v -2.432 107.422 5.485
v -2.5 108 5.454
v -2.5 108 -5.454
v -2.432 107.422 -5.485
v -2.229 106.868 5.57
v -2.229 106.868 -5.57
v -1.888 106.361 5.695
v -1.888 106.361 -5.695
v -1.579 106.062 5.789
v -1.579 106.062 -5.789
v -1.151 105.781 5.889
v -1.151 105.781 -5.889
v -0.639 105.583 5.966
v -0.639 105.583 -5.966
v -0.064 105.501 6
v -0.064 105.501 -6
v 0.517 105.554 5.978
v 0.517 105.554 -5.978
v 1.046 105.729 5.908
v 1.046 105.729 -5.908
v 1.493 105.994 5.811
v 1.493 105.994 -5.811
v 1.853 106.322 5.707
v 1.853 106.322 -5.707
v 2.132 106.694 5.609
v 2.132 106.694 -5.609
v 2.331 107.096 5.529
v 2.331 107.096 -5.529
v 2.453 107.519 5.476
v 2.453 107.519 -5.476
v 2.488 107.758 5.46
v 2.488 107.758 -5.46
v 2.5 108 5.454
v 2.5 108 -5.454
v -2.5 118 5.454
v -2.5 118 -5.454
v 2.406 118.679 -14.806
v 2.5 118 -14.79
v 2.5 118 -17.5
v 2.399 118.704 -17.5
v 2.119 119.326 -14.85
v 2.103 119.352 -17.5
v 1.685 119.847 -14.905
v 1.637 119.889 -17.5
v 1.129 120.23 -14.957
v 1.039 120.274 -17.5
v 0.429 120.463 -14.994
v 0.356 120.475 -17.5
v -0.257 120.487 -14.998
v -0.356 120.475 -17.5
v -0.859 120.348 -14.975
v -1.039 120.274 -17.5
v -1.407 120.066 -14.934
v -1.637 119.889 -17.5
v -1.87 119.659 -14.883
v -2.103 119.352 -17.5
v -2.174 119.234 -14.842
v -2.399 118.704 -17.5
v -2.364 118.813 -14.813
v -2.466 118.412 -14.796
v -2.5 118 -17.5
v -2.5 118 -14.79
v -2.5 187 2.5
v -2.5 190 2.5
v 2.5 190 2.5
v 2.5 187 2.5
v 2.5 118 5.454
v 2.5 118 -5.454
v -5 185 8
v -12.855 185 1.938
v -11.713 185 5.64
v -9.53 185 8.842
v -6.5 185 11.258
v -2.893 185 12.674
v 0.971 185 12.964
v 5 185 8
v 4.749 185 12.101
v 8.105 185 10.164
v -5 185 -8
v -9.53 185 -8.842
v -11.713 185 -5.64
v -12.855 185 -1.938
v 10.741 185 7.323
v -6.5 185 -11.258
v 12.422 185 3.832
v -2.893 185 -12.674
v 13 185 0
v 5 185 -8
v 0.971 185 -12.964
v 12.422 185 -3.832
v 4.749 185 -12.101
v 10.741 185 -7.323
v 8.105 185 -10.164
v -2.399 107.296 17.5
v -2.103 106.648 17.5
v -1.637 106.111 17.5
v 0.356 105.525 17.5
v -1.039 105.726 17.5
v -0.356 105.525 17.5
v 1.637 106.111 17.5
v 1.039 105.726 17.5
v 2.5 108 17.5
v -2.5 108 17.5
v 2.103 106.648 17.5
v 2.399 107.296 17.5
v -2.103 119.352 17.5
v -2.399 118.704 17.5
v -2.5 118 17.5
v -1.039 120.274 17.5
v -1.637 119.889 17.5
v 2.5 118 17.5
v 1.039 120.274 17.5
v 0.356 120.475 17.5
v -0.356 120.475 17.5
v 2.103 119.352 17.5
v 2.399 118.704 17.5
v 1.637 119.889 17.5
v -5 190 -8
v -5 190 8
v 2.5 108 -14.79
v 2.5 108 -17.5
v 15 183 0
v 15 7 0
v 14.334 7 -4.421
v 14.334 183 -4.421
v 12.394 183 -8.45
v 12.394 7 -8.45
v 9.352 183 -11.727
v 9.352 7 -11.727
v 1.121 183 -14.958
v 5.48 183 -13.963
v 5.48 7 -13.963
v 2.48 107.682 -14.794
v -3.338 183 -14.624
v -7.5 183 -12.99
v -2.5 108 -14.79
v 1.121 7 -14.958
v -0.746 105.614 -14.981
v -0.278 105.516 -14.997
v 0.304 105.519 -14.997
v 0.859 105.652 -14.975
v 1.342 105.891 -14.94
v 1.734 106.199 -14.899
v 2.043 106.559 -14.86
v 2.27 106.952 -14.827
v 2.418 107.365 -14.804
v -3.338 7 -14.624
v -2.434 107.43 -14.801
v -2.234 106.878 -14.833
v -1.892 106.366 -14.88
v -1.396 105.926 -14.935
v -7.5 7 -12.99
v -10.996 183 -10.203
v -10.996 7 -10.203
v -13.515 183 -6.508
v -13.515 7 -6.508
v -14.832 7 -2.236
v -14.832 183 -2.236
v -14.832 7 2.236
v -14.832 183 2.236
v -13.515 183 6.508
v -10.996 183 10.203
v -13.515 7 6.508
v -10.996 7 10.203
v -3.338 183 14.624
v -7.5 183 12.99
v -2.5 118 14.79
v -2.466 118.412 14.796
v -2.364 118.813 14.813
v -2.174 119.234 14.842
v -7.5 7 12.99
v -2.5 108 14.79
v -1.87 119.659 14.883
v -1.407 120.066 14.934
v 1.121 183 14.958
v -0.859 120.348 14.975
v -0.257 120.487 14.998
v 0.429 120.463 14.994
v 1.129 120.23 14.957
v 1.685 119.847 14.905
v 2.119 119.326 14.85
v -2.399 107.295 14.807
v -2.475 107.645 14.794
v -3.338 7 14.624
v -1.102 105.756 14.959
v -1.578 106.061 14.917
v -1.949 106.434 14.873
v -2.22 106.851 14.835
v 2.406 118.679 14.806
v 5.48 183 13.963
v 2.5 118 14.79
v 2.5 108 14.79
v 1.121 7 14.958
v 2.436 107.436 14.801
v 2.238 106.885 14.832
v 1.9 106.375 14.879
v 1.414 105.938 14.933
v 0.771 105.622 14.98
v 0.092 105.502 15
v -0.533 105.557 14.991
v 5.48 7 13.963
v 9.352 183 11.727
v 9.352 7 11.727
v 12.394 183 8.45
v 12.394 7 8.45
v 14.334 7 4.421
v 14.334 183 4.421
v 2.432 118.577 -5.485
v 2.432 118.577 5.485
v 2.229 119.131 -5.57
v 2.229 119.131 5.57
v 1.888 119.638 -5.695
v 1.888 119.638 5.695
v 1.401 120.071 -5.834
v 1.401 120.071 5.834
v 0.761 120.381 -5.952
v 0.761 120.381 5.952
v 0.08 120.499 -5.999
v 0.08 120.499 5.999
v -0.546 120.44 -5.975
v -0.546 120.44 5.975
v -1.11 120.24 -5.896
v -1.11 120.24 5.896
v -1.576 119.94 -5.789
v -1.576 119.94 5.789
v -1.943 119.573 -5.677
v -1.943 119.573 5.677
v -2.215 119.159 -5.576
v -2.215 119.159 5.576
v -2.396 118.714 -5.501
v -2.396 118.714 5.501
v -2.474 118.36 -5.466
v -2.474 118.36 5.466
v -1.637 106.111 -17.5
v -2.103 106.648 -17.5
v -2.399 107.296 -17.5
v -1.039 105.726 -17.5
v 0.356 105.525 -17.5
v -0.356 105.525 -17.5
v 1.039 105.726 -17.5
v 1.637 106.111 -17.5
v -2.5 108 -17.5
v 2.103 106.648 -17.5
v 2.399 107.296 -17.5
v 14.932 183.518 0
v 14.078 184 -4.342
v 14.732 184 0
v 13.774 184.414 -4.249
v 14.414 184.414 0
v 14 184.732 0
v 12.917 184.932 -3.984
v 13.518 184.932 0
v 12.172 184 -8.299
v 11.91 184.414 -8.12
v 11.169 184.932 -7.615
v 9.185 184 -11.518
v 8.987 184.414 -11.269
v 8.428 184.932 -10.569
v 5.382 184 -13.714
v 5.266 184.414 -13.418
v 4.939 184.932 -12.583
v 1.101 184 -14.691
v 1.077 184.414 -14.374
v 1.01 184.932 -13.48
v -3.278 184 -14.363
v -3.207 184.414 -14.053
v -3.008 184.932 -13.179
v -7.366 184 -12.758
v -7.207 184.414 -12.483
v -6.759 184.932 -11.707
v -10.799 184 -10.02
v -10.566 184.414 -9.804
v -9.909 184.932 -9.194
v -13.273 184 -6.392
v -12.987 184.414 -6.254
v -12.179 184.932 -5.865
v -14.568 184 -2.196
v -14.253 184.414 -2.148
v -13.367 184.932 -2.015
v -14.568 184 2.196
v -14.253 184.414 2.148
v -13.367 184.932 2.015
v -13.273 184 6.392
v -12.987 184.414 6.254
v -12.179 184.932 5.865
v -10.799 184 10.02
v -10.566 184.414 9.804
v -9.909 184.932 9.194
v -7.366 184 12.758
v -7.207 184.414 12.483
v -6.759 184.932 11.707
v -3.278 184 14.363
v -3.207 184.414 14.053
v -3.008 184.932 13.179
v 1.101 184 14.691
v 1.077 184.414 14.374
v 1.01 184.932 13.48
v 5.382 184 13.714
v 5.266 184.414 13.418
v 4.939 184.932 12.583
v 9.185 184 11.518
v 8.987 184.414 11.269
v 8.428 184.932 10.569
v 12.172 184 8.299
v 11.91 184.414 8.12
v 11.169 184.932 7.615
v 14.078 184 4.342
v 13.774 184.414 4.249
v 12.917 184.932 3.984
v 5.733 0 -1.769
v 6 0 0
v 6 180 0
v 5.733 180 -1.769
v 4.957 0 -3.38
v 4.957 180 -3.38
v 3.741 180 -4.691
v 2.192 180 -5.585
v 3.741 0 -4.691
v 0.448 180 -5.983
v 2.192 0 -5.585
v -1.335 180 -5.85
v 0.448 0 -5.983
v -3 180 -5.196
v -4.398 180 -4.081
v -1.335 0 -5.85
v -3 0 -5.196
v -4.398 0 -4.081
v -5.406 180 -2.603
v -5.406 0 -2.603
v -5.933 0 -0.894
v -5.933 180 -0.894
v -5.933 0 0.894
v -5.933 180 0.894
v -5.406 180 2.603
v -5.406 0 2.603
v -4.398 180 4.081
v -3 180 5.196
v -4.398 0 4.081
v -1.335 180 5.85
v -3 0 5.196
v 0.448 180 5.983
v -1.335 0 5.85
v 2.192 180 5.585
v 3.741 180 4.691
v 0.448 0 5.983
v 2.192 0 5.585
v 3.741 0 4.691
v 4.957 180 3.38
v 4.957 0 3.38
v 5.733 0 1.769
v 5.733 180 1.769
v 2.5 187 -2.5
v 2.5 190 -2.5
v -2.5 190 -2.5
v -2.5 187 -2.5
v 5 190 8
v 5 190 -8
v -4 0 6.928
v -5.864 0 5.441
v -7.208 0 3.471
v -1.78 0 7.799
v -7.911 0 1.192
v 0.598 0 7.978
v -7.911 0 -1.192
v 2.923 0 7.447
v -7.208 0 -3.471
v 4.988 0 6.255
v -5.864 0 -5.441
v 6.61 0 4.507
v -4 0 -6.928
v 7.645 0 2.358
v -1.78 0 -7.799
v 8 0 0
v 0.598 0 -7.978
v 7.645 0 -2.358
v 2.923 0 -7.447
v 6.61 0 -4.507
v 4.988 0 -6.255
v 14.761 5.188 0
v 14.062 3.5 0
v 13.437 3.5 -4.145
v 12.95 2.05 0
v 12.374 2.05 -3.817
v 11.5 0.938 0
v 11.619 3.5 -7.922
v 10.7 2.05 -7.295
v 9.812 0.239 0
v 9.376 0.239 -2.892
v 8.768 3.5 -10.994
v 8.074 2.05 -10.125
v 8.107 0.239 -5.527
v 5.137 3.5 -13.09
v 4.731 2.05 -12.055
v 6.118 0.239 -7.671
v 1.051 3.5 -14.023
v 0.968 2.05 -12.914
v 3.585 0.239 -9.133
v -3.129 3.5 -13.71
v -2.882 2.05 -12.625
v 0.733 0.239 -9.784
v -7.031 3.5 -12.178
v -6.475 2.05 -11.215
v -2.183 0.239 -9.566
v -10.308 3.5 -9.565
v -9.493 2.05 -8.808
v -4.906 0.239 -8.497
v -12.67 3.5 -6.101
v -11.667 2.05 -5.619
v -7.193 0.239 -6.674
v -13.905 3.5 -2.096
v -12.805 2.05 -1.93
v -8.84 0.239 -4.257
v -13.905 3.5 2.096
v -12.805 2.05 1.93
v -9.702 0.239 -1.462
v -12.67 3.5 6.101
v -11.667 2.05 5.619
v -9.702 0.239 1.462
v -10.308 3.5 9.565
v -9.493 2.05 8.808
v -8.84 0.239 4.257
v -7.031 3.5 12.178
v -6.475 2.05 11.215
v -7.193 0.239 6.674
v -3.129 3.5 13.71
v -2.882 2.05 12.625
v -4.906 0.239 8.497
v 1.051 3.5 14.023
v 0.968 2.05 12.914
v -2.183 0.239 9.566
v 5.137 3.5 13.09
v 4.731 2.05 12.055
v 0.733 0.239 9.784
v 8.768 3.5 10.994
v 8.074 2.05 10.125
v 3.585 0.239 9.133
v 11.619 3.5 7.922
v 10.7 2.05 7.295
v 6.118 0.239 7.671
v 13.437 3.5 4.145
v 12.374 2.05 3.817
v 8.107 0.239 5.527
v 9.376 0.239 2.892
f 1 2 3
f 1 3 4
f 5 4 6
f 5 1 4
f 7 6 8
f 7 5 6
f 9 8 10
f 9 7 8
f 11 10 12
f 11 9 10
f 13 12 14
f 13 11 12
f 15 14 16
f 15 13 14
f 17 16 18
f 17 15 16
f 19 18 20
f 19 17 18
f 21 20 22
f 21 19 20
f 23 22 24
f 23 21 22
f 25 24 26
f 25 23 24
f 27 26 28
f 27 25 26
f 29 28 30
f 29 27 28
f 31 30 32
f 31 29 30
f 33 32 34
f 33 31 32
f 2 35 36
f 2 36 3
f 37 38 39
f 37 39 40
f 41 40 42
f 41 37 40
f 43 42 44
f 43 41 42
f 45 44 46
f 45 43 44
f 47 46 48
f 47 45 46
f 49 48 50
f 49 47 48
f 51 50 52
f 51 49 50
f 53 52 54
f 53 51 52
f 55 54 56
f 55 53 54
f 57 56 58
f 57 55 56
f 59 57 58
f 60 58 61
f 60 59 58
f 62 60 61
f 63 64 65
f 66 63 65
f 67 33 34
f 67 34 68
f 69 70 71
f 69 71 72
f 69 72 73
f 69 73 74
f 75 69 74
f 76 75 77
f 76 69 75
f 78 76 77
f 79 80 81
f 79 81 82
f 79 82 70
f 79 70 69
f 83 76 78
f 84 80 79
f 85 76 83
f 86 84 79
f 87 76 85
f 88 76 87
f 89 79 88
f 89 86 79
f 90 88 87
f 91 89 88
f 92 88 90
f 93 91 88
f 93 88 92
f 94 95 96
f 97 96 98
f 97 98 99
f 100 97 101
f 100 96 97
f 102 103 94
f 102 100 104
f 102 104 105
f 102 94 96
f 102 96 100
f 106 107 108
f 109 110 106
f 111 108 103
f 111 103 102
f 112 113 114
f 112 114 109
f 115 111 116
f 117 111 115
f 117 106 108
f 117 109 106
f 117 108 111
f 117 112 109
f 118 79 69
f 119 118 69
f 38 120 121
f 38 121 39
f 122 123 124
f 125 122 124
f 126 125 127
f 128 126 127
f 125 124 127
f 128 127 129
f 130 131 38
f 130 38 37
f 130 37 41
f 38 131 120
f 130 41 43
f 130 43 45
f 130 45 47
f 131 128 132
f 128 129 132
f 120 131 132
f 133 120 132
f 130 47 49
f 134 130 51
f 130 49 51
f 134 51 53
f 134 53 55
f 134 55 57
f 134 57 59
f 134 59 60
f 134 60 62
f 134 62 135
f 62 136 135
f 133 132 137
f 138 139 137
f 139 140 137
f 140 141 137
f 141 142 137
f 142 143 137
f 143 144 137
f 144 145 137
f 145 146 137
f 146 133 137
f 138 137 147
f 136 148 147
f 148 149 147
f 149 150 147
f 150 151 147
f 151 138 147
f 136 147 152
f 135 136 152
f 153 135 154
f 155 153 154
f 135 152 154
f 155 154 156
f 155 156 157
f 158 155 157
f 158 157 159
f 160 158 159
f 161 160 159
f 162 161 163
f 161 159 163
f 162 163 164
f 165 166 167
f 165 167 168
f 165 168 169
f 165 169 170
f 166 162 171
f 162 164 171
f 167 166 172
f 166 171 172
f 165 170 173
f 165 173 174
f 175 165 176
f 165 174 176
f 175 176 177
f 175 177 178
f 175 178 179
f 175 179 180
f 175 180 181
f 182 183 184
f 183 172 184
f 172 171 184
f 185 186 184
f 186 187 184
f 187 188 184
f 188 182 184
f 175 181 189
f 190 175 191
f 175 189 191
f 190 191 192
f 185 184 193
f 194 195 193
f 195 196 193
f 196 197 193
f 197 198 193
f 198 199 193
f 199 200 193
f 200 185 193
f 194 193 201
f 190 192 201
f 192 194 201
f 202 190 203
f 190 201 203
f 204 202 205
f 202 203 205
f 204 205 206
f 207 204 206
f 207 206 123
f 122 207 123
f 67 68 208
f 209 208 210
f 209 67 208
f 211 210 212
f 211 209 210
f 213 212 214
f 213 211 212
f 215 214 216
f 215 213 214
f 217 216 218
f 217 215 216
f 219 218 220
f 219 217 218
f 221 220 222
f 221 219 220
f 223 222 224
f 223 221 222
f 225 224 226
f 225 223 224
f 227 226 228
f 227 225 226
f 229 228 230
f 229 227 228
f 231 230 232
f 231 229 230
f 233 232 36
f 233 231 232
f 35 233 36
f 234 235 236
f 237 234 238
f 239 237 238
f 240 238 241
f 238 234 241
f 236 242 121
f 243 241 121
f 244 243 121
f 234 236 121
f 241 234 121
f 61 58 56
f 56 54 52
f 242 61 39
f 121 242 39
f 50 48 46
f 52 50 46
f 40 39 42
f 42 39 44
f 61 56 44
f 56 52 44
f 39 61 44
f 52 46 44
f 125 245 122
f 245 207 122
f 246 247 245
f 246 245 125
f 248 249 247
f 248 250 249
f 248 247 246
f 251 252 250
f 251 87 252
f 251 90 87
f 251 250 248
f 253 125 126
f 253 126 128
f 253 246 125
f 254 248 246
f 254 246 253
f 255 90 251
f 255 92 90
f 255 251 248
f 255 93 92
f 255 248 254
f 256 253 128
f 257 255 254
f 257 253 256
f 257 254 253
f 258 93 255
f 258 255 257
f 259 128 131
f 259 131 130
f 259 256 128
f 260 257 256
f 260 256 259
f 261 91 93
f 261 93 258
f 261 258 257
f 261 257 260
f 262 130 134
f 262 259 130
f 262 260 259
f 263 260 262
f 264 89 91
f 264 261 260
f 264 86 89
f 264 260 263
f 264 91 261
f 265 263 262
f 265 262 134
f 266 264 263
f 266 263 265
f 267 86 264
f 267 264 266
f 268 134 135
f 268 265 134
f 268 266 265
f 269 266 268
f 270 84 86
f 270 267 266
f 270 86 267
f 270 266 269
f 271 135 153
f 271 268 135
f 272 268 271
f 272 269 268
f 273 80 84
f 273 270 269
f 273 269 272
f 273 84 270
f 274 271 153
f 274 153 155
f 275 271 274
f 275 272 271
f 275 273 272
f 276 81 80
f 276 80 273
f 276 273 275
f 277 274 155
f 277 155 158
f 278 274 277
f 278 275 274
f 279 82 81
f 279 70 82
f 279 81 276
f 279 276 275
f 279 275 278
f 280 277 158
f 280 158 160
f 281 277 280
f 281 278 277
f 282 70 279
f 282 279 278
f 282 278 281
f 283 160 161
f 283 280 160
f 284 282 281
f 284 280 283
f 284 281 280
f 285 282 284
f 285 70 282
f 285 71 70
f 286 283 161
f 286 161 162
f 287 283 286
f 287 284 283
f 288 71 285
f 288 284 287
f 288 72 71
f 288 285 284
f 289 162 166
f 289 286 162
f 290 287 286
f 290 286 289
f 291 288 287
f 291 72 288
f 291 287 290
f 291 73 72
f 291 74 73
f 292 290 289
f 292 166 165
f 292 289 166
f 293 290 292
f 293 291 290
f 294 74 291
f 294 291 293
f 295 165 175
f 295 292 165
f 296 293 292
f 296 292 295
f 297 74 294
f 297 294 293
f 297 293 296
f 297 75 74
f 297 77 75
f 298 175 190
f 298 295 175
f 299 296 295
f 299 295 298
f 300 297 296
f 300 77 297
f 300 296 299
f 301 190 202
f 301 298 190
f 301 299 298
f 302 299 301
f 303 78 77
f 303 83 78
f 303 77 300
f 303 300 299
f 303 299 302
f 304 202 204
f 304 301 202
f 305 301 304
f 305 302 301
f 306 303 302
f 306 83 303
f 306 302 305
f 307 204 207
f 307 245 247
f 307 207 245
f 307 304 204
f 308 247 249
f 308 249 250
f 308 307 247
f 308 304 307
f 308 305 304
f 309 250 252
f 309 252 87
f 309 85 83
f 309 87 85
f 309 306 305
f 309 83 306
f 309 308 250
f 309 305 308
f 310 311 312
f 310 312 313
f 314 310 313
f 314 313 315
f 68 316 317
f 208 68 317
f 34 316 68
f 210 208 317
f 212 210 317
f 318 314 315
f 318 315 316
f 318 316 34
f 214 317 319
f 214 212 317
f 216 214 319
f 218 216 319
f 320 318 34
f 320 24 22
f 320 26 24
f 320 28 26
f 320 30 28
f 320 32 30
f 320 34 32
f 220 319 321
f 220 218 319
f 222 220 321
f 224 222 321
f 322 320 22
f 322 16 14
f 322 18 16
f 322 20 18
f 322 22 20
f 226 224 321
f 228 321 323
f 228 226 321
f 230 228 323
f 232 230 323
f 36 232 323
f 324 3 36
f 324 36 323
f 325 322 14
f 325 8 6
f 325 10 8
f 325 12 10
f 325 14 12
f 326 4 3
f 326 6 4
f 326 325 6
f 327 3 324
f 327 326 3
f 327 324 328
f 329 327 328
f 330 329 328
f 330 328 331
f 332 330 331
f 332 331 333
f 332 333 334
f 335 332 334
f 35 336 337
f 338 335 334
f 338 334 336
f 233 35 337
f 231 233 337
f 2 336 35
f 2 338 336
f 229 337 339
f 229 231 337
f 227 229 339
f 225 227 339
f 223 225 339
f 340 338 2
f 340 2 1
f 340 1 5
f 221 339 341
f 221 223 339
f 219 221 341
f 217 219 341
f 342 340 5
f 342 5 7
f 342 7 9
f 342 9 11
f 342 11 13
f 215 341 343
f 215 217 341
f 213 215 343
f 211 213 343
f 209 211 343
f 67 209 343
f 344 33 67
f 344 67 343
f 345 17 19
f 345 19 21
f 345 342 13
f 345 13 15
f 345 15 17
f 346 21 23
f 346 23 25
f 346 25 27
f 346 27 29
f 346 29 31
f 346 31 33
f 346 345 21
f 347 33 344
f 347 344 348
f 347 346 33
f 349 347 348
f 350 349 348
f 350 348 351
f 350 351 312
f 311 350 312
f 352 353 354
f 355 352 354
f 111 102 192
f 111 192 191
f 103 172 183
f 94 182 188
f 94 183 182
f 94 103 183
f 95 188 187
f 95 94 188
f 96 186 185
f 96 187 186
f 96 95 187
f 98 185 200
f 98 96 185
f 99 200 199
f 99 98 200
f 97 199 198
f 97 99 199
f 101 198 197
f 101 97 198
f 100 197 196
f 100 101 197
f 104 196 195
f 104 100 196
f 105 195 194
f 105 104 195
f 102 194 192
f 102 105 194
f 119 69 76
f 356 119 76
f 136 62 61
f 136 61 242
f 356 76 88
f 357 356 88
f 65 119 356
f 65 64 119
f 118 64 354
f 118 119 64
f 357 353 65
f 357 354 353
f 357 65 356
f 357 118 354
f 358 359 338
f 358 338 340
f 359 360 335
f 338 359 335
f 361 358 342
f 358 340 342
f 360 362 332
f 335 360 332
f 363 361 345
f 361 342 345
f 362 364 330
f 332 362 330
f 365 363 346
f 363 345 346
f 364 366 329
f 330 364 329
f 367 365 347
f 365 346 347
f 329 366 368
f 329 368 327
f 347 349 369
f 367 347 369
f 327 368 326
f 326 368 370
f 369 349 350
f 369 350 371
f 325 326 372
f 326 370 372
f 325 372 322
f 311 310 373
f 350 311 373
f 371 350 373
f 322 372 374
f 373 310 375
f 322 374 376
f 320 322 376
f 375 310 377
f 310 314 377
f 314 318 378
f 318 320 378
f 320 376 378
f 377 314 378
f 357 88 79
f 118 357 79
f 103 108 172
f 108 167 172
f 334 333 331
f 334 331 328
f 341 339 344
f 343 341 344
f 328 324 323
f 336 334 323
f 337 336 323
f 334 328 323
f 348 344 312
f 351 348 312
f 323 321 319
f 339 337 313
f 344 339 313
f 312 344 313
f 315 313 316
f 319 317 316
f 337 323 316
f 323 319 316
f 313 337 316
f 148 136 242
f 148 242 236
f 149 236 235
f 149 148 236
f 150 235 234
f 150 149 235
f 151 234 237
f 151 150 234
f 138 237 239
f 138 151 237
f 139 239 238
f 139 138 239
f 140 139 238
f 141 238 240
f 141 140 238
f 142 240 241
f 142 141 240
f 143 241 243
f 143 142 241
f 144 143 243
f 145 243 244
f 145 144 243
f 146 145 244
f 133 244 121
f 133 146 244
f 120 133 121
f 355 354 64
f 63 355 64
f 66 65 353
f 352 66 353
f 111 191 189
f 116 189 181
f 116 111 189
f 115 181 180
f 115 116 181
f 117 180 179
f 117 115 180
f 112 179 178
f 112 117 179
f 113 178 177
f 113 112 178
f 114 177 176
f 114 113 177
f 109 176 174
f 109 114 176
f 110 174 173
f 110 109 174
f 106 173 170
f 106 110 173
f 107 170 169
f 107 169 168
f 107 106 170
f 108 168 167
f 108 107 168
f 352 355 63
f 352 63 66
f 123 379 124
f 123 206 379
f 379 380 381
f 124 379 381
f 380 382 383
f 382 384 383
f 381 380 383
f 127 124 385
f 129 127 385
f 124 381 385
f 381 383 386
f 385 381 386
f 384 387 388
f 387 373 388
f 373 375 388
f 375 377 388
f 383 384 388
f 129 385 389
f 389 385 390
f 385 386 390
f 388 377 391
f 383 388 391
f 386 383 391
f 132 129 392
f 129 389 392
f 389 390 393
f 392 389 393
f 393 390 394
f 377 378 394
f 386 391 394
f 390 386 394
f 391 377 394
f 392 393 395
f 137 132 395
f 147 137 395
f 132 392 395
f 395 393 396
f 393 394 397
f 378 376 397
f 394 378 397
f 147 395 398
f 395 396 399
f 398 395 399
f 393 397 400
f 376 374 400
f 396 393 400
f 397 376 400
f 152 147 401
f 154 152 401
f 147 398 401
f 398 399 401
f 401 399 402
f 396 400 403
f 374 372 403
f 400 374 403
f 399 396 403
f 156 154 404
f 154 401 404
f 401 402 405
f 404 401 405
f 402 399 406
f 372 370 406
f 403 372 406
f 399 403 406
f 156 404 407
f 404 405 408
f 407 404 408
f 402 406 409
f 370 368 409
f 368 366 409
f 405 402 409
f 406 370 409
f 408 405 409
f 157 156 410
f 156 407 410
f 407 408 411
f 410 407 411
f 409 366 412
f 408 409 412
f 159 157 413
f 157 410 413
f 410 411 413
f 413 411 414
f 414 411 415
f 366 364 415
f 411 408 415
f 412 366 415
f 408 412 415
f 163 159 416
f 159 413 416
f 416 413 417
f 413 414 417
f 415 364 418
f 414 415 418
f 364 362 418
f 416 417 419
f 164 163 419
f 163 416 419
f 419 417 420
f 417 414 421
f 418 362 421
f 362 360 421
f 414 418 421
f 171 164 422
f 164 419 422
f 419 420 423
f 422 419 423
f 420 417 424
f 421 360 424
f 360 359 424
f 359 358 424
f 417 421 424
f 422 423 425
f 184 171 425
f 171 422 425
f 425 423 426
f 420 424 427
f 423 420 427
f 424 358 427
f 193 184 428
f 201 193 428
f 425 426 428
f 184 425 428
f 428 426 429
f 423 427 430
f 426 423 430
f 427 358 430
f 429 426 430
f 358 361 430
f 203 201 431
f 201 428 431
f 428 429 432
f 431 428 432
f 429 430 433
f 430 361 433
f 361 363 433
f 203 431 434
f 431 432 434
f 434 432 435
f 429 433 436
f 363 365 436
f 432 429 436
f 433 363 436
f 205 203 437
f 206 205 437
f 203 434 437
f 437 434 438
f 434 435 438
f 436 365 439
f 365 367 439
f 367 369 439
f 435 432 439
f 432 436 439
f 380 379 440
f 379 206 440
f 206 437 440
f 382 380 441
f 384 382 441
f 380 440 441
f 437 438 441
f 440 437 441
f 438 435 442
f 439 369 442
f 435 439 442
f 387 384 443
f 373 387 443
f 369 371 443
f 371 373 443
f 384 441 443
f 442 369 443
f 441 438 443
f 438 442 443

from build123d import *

# Parameters (mm, degrees)
SKETCH1_R                = 15
BOSS_EXTRUDE1_DEPTH      = 185
FILLET2_R                = 7
FILLET3_R                = 2
SKETCH2_R                = 6
CUT_EXTRUDE1_DEPTH       = 180
BOSS_EXTRUDE3_DEPTH      = 2.5
BOSS_EXTRUDE3_DEPTH_BACK = 32.5
BOSS_EXTRUDE4_START      = 185
BOSS_EXTRUDE4_DEPTH      = 5
CUT_EXTRUDE3_DEPTH       = 3


with BuildPart() as part:
    # Sketch1 → Boss-Extrude1 (new body)
    with BuildSketch(Plane(origin=(0, 0, 0), x_dir=(1, 0, 0), z_dir=(0, 1, 0))):
        Circle(SKETCH1_R)
    extrude(amount=BOSS_EXTRUDE1_DEPTH)

    # Fillet2
    fillet2_edges = [part.edges().sort_by_distance(p)[0] for p in [
        (-15, 0, 0),
    ]]
    fillet(fillet2_edges, radius=FILLET2_R)

    # Fillet3
    fillet3_edges = [part.edges().sort_by_distance(p)[0] for p in [
        (-15, 185, 0),
    ]]
    fillet(fillet3_edges, radius=FILLET3_R)

    # Sketch2 → Cut-Extrude1 (cut)
    with BuildSketch(Plane(origin=(0, 0, 0), x_dir=(1, 0, 0), z_dir=(0, 1, 0))):
        Circle(SKETCH2_R)
    extrude(amount=CUT_EXTRUDE1_DEPTH, mode=Mode.SUBTRACT)

    # Sketch7 → Boss-Extrude3 (add, two sides)
    with BuildSketch(Plane.XY.offset(15)) as boss_extrude3_sk:
        with BuildLine():
            Line((2.5, 113), (2.5, 118))
            ThreePointArc((2.5, 118), (0, 120.5), (-2.5, 118))
            Line((-2.5, 118), (-2.5, 113))
            Line((-2.5, 113), (-2.5, 108))
            ThreePointArc((-2.5, 108), (0, 105.5), (2.5, 108))
            Line((2.5, 108), (2.5, 113))
        make_face()
    extrude(amount=BOSS_EXTRUDE3_DEPTH)
    extrude(boss_extrude3_sk.sketch, amount=-BOSS_EXTRUDE3_DEPTH_BACK)

    # Sketch8 → Boss-Extrude4 (add)
    with BuildSketch(Plane(origin=(0, 0, 0), x_dir=(1, 0, 0), z_dir=(0, 1, 0)).offset(BOSS_EXTRUDE4_START)):
        Polygon((0, 8), (-5, 8), (-5, 0), (-5, -8), (0, -8), (5, -8), (5, 0), (5, 8), align=None)
    extrude(amount=BOSS_EXTRUDE4_DEPTH)

    # Sketch10 → Cut-Extrude3 (cut)
    with BuildSketch(Plane(origin=(0, 190, 0), x_dir=(1, 0, 0), z_dir=(0, 1, 0))):
        Polygon((0, -2.5), (2.5, -2.5), (2.5, 2.5), (0, 2.5), (-2.5, 2.5), (-2.5, -2.5), align=None)
    extrude(amount=-CUT_EXTRUDE3_DEPTH, mode=Mode.SUBTRACT)


solid = part.part
